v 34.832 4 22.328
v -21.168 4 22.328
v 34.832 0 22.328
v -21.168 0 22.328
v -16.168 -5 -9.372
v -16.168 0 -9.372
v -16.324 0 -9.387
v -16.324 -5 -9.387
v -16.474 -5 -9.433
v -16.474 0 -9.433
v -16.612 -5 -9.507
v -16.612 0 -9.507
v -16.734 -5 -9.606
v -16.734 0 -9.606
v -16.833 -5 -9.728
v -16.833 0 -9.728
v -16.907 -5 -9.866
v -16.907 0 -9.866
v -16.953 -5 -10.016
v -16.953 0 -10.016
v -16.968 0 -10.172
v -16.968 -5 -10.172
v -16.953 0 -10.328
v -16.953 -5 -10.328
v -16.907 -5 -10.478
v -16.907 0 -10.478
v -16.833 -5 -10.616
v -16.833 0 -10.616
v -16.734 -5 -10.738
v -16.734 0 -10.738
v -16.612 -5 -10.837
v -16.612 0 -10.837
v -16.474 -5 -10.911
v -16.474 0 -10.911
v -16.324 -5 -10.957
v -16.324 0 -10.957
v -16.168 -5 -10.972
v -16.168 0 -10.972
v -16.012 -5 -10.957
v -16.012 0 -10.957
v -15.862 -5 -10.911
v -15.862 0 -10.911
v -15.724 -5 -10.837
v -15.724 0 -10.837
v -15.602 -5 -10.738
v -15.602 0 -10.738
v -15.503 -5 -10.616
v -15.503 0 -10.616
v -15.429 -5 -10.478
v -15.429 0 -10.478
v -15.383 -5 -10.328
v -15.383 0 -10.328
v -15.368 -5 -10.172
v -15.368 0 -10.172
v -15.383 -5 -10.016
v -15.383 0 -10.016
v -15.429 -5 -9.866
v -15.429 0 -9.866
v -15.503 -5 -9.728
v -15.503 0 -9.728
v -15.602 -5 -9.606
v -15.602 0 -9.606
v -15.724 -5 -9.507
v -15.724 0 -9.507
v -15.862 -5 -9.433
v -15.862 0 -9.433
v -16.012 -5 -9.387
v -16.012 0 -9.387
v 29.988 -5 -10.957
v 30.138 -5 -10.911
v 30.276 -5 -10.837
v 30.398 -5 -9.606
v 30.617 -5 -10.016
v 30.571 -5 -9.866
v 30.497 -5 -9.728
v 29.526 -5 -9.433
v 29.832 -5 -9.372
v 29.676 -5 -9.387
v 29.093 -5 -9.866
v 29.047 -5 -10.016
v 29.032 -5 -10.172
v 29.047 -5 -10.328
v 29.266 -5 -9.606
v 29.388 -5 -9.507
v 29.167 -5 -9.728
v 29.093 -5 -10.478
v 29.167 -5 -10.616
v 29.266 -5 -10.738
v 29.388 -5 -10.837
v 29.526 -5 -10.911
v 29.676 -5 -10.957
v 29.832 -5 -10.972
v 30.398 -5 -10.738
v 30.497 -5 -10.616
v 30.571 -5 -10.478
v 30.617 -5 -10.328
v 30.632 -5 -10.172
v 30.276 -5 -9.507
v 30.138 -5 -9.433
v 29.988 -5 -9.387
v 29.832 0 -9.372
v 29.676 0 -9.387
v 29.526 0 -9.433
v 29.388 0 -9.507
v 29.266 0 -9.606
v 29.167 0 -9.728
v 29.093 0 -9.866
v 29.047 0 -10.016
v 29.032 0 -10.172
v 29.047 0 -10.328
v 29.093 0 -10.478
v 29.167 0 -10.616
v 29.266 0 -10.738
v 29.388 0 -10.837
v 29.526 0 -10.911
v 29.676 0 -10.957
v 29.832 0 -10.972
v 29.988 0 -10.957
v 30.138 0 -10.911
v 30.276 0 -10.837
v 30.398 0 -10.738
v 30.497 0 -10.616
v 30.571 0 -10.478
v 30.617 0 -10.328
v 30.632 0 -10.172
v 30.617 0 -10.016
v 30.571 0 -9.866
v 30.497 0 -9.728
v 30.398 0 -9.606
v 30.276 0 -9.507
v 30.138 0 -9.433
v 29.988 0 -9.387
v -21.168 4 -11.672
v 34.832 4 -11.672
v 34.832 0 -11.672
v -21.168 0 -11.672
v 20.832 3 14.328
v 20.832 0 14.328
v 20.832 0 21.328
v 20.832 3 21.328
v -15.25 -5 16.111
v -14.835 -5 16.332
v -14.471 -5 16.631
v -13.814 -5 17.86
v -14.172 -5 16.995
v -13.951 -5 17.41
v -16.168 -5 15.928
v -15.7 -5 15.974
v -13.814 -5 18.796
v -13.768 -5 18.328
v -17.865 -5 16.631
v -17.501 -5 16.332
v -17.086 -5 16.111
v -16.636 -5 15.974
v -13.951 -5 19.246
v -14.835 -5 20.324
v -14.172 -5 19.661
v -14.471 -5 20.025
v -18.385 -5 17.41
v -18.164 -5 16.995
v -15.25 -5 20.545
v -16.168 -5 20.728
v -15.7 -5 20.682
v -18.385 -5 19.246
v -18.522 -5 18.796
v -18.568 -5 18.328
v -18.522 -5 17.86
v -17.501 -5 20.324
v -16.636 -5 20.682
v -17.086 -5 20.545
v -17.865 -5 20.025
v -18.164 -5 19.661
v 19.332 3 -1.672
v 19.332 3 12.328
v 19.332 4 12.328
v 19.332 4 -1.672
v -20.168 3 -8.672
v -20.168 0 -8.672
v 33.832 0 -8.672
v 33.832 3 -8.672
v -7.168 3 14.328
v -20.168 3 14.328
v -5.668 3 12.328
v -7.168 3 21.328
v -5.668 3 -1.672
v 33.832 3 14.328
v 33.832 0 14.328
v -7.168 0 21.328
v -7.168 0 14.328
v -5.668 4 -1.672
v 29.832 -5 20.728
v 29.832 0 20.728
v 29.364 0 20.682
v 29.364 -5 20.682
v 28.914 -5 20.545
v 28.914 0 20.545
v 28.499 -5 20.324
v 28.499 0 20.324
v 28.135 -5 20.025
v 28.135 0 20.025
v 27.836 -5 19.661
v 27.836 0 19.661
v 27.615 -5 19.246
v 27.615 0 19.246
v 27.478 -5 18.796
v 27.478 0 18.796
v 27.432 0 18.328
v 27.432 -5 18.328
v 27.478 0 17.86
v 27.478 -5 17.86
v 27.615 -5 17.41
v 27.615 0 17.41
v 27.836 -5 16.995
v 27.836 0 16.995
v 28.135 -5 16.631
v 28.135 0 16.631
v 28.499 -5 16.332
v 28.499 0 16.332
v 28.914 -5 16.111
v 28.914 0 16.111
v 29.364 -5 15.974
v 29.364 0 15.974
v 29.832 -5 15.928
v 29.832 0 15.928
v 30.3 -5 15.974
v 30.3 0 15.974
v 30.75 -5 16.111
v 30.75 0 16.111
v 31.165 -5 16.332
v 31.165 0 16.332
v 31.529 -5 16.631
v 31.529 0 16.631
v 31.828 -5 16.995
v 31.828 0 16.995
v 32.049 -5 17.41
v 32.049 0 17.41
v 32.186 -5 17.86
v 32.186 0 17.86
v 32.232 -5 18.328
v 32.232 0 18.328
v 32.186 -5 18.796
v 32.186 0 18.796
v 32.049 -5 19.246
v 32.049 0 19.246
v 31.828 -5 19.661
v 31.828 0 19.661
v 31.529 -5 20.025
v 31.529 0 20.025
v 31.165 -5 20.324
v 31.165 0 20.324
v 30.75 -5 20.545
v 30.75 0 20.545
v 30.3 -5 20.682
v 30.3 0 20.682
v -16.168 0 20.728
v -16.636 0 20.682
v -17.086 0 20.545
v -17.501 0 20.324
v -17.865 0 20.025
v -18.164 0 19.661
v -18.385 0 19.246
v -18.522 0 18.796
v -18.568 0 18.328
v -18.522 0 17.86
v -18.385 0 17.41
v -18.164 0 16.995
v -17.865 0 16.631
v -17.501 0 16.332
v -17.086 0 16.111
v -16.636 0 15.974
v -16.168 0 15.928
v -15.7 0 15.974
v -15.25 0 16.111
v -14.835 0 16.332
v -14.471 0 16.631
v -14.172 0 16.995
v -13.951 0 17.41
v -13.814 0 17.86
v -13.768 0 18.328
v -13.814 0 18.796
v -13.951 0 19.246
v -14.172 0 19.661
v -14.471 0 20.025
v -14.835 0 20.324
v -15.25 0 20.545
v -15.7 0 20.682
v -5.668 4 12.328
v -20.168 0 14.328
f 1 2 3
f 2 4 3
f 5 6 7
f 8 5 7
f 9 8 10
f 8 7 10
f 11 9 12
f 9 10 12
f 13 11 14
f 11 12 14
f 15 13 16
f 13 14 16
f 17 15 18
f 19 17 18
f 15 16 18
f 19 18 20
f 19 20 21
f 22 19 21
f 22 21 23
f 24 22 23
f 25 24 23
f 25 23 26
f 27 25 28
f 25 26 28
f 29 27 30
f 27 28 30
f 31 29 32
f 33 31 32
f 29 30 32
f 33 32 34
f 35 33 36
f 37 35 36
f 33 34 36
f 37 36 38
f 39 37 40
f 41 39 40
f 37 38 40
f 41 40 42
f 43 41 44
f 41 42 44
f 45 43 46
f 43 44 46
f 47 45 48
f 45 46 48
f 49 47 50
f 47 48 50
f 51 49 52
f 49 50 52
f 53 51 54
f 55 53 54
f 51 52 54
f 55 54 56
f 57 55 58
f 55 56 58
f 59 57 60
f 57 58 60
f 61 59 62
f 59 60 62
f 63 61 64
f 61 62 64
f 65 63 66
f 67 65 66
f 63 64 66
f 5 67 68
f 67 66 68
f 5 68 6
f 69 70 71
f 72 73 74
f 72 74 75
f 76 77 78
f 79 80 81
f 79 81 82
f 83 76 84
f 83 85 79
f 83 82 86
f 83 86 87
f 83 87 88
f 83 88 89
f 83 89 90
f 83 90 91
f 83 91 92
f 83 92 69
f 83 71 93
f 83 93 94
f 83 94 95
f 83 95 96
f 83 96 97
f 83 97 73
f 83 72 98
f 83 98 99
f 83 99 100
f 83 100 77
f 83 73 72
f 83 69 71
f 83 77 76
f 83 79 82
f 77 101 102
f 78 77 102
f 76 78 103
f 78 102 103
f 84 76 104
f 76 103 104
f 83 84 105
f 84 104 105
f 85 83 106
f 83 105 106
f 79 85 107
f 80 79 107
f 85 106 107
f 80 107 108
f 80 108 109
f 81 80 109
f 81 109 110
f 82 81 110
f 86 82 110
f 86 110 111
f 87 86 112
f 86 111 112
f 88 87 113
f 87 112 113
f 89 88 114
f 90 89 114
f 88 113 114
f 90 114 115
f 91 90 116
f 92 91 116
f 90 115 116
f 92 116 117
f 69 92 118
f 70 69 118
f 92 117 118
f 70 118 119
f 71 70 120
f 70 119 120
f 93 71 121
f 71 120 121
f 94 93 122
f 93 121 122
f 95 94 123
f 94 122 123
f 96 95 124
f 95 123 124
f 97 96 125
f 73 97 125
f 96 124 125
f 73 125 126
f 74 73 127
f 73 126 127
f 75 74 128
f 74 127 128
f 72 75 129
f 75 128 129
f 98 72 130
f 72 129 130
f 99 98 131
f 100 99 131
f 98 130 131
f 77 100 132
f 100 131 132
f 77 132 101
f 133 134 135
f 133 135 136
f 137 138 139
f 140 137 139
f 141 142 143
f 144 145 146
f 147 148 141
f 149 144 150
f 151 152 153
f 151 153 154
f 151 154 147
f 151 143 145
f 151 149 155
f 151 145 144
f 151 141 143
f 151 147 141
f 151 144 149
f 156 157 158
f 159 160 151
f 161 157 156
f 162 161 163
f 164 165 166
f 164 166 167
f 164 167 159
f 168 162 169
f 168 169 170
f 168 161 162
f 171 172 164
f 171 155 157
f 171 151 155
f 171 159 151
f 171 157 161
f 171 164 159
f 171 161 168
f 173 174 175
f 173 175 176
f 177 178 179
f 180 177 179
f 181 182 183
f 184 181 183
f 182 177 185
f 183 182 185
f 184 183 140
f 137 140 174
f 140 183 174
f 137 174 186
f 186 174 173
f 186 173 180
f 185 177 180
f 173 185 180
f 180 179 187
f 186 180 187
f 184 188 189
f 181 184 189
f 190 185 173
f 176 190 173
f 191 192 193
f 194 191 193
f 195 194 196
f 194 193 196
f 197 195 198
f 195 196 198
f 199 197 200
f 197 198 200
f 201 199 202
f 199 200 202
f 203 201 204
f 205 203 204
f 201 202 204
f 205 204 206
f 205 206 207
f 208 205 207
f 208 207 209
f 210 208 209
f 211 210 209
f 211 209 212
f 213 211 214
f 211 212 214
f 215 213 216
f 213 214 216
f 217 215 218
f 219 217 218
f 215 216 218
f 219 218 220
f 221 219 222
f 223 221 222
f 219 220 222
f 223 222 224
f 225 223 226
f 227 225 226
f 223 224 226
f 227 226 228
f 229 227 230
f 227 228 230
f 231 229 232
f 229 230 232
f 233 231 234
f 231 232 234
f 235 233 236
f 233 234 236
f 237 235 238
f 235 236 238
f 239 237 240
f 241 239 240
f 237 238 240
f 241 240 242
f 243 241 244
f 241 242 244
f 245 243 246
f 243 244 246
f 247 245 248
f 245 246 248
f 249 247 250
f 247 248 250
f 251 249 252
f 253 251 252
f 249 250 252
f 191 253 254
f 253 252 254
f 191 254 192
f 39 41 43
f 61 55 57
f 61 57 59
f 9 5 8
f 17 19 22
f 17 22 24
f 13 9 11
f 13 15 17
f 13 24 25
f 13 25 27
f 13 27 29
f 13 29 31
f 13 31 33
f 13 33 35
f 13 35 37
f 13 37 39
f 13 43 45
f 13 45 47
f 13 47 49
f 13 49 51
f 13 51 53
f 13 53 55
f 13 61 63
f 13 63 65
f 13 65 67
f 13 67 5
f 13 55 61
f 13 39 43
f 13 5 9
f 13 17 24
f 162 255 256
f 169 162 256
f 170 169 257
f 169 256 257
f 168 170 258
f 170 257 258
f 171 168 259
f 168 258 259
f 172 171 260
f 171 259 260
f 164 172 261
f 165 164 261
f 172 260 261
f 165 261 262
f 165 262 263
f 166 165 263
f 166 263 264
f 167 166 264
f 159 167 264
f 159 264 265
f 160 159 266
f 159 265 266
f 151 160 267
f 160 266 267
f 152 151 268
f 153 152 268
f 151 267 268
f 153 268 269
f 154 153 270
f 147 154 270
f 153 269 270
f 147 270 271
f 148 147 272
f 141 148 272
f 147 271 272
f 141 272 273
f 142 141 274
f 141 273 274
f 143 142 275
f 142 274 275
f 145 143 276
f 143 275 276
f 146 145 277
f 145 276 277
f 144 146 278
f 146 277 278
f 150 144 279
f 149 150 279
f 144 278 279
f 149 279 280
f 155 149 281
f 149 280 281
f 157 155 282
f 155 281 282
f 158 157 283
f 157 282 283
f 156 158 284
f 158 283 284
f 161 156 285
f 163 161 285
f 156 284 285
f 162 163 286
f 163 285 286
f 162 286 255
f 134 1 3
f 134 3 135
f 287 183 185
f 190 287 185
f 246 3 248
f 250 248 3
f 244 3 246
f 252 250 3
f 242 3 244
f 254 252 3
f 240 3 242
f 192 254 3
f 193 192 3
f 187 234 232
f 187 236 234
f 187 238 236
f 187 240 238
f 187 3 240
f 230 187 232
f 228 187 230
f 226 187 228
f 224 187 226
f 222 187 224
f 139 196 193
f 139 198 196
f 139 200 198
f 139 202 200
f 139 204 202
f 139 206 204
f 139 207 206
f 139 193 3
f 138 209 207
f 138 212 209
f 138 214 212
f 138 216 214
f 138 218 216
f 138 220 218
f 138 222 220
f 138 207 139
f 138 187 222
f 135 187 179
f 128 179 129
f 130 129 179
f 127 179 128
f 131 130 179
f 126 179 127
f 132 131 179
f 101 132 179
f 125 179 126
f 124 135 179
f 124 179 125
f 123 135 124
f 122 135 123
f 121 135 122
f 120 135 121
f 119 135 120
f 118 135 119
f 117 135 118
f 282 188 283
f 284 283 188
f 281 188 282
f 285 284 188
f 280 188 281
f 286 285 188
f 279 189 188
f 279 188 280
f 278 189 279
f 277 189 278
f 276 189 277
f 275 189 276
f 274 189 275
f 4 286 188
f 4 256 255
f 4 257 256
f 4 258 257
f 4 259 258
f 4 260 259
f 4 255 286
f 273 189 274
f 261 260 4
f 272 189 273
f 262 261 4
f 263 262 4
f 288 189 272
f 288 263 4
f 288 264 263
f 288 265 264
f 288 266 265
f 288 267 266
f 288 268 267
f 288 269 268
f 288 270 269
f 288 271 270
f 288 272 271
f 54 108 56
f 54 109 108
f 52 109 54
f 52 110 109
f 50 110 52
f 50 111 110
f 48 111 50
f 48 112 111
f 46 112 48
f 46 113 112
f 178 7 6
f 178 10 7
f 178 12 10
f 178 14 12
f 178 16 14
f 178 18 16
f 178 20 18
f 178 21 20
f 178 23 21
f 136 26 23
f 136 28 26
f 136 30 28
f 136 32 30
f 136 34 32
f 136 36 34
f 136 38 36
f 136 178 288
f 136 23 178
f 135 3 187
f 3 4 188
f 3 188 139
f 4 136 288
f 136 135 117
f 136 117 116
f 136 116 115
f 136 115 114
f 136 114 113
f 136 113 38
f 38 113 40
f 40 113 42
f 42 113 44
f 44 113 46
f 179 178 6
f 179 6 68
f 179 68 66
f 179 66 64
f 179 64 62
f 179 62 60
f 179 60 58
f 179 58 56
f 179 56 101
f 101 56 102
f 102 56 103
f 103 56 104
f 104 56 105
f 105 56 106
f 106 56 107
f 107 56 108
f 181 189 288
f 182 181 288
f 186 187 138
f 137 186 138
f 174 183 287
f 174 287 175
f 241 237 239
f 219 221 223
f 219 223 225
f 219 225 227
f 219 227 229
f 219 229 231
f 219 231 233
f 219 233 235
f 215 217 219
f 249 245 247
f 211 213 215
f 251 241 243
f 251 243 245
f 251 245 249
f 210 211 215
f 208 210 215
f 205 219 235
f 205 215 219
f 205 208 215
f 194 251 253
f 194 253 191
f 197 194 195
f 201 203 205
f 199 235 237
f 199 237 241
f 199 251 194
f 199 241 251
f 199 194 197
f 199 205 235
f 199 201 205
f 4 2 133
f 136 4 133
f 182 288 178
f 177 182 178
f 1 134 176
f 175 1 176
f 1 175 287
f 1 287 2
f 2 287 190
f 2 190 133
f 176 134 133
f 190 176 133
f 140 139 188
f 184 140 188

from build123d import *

# Parameters (mm, degrees)
SKETCH_2_W      = 56
SKETCH_2_H      = 32
EXTRUDE_1_DEPTH = 3
SKETCH_3_W      = 56
SKETCH_3_H      = 32
SKETCH_3_W_2    = 25
SKETCH_3_H_2    = 14
EXTRUDE_2_DEPTH = 1
SKETCH_4_R      = 2.4
EXTRUDE_3_DEPTH = 5
SKETCH_6_W      = 56
SKETCH_6_H      = 2
EXTRUDE_4_DEPTH = 4
SKETCH_7_R      = 0.8
EXTRUDE_5_DEPTH = 5


with BuildPart() as part:
    # 草图2 → 凸台-拉伸1 (new body)
    with BuildSketch(Plane(origin=(0, 0, 0), x_dir=(1, 0, 0), z_dir=(0, 1, 0))):
        with Locations((6.832, -6.328)):
            Rectangle(SKETCH_2_W, SKETCH_2_H)
        Polygon((-20.168, -11.589207904), (-20.168, 4.317392289), (-20.168, 8.672), (33.832, 8.672), (33.832, -14.328), (20.832, -14.328), (20.832, -21.328), (-7.168, -21.328), (-7.168, -14.328), (-20.168, -14.328), align=None, mode=Mode.SUBTRACT)
    extrude(amount=EXTRUDE_1_DEPTH)

    # 草图3 → 凸台-拉伸2 (add)
    with BuildSketch(Plane(origin=(0, 3, 0), x_dir=(1, 0, 0), z_dir=(0, 1, 0))):
        with Locations((6.832, -6.328)):
            Rectangle(SKETCH_3_W, SKETCH_3_H)
        with Locations((6.832, -5.328)):
            Rectangle(SKETCH_3_W_2, SKETCH_3_H_2, mode=Mode.SUBTRACT)
    extrude(amount=EXTRUDE_2_DEPTH)

    # 草图4 → 凸台-拉伸3 (add)
    with BuildSketch(Plane(origin=(0, 0, 0), x_dir=(-1, 0, 0), z_dir=(0, -1, 0))):
        with Locations(Location((16.168, -18.328, 0), (0, 0, 270))):
            Circle(SKETCH_4_R)
        with Locations(Location((-29.832, -18.328, 0), (0, 0, 270))):
            Circle(SKETCH_4_R)
    extrude(amount=EXTRUDE_3_DEPTH)

    # 草图6 → 凸台-拉伸4 (add)
    with BuildSketch(Plane(origin=(0, 4, 0), x_dir=(-1, 0, 0), z_dir=(0, -1, 0))):
        with Locations((-6.832, 10.672)):
            Rectangle(SKETCH_6_W, SKETCH_6_H)
    extrude(amount=EXTRUDE_4_DEPTH)

    # 草图7 → 凸台-拉伸5 (add)
    with BuildSketch(Plane(origin=(0, 0, 0), x_dir=(-1, 0, 0), z_dir=(0, -1, 0))):
        with Locations(Location((-29.832, 10.172, 0), (0, 0, 270))):
            Circle(SKETCH_7_R)
        with Locations(Location((16.168, 10.172, 0), (0, 0, 270))):
            Circle(SKETCH_7_R)
    extrude(amount=EXTRUDE_5_DEPTH)


solid = part.part
